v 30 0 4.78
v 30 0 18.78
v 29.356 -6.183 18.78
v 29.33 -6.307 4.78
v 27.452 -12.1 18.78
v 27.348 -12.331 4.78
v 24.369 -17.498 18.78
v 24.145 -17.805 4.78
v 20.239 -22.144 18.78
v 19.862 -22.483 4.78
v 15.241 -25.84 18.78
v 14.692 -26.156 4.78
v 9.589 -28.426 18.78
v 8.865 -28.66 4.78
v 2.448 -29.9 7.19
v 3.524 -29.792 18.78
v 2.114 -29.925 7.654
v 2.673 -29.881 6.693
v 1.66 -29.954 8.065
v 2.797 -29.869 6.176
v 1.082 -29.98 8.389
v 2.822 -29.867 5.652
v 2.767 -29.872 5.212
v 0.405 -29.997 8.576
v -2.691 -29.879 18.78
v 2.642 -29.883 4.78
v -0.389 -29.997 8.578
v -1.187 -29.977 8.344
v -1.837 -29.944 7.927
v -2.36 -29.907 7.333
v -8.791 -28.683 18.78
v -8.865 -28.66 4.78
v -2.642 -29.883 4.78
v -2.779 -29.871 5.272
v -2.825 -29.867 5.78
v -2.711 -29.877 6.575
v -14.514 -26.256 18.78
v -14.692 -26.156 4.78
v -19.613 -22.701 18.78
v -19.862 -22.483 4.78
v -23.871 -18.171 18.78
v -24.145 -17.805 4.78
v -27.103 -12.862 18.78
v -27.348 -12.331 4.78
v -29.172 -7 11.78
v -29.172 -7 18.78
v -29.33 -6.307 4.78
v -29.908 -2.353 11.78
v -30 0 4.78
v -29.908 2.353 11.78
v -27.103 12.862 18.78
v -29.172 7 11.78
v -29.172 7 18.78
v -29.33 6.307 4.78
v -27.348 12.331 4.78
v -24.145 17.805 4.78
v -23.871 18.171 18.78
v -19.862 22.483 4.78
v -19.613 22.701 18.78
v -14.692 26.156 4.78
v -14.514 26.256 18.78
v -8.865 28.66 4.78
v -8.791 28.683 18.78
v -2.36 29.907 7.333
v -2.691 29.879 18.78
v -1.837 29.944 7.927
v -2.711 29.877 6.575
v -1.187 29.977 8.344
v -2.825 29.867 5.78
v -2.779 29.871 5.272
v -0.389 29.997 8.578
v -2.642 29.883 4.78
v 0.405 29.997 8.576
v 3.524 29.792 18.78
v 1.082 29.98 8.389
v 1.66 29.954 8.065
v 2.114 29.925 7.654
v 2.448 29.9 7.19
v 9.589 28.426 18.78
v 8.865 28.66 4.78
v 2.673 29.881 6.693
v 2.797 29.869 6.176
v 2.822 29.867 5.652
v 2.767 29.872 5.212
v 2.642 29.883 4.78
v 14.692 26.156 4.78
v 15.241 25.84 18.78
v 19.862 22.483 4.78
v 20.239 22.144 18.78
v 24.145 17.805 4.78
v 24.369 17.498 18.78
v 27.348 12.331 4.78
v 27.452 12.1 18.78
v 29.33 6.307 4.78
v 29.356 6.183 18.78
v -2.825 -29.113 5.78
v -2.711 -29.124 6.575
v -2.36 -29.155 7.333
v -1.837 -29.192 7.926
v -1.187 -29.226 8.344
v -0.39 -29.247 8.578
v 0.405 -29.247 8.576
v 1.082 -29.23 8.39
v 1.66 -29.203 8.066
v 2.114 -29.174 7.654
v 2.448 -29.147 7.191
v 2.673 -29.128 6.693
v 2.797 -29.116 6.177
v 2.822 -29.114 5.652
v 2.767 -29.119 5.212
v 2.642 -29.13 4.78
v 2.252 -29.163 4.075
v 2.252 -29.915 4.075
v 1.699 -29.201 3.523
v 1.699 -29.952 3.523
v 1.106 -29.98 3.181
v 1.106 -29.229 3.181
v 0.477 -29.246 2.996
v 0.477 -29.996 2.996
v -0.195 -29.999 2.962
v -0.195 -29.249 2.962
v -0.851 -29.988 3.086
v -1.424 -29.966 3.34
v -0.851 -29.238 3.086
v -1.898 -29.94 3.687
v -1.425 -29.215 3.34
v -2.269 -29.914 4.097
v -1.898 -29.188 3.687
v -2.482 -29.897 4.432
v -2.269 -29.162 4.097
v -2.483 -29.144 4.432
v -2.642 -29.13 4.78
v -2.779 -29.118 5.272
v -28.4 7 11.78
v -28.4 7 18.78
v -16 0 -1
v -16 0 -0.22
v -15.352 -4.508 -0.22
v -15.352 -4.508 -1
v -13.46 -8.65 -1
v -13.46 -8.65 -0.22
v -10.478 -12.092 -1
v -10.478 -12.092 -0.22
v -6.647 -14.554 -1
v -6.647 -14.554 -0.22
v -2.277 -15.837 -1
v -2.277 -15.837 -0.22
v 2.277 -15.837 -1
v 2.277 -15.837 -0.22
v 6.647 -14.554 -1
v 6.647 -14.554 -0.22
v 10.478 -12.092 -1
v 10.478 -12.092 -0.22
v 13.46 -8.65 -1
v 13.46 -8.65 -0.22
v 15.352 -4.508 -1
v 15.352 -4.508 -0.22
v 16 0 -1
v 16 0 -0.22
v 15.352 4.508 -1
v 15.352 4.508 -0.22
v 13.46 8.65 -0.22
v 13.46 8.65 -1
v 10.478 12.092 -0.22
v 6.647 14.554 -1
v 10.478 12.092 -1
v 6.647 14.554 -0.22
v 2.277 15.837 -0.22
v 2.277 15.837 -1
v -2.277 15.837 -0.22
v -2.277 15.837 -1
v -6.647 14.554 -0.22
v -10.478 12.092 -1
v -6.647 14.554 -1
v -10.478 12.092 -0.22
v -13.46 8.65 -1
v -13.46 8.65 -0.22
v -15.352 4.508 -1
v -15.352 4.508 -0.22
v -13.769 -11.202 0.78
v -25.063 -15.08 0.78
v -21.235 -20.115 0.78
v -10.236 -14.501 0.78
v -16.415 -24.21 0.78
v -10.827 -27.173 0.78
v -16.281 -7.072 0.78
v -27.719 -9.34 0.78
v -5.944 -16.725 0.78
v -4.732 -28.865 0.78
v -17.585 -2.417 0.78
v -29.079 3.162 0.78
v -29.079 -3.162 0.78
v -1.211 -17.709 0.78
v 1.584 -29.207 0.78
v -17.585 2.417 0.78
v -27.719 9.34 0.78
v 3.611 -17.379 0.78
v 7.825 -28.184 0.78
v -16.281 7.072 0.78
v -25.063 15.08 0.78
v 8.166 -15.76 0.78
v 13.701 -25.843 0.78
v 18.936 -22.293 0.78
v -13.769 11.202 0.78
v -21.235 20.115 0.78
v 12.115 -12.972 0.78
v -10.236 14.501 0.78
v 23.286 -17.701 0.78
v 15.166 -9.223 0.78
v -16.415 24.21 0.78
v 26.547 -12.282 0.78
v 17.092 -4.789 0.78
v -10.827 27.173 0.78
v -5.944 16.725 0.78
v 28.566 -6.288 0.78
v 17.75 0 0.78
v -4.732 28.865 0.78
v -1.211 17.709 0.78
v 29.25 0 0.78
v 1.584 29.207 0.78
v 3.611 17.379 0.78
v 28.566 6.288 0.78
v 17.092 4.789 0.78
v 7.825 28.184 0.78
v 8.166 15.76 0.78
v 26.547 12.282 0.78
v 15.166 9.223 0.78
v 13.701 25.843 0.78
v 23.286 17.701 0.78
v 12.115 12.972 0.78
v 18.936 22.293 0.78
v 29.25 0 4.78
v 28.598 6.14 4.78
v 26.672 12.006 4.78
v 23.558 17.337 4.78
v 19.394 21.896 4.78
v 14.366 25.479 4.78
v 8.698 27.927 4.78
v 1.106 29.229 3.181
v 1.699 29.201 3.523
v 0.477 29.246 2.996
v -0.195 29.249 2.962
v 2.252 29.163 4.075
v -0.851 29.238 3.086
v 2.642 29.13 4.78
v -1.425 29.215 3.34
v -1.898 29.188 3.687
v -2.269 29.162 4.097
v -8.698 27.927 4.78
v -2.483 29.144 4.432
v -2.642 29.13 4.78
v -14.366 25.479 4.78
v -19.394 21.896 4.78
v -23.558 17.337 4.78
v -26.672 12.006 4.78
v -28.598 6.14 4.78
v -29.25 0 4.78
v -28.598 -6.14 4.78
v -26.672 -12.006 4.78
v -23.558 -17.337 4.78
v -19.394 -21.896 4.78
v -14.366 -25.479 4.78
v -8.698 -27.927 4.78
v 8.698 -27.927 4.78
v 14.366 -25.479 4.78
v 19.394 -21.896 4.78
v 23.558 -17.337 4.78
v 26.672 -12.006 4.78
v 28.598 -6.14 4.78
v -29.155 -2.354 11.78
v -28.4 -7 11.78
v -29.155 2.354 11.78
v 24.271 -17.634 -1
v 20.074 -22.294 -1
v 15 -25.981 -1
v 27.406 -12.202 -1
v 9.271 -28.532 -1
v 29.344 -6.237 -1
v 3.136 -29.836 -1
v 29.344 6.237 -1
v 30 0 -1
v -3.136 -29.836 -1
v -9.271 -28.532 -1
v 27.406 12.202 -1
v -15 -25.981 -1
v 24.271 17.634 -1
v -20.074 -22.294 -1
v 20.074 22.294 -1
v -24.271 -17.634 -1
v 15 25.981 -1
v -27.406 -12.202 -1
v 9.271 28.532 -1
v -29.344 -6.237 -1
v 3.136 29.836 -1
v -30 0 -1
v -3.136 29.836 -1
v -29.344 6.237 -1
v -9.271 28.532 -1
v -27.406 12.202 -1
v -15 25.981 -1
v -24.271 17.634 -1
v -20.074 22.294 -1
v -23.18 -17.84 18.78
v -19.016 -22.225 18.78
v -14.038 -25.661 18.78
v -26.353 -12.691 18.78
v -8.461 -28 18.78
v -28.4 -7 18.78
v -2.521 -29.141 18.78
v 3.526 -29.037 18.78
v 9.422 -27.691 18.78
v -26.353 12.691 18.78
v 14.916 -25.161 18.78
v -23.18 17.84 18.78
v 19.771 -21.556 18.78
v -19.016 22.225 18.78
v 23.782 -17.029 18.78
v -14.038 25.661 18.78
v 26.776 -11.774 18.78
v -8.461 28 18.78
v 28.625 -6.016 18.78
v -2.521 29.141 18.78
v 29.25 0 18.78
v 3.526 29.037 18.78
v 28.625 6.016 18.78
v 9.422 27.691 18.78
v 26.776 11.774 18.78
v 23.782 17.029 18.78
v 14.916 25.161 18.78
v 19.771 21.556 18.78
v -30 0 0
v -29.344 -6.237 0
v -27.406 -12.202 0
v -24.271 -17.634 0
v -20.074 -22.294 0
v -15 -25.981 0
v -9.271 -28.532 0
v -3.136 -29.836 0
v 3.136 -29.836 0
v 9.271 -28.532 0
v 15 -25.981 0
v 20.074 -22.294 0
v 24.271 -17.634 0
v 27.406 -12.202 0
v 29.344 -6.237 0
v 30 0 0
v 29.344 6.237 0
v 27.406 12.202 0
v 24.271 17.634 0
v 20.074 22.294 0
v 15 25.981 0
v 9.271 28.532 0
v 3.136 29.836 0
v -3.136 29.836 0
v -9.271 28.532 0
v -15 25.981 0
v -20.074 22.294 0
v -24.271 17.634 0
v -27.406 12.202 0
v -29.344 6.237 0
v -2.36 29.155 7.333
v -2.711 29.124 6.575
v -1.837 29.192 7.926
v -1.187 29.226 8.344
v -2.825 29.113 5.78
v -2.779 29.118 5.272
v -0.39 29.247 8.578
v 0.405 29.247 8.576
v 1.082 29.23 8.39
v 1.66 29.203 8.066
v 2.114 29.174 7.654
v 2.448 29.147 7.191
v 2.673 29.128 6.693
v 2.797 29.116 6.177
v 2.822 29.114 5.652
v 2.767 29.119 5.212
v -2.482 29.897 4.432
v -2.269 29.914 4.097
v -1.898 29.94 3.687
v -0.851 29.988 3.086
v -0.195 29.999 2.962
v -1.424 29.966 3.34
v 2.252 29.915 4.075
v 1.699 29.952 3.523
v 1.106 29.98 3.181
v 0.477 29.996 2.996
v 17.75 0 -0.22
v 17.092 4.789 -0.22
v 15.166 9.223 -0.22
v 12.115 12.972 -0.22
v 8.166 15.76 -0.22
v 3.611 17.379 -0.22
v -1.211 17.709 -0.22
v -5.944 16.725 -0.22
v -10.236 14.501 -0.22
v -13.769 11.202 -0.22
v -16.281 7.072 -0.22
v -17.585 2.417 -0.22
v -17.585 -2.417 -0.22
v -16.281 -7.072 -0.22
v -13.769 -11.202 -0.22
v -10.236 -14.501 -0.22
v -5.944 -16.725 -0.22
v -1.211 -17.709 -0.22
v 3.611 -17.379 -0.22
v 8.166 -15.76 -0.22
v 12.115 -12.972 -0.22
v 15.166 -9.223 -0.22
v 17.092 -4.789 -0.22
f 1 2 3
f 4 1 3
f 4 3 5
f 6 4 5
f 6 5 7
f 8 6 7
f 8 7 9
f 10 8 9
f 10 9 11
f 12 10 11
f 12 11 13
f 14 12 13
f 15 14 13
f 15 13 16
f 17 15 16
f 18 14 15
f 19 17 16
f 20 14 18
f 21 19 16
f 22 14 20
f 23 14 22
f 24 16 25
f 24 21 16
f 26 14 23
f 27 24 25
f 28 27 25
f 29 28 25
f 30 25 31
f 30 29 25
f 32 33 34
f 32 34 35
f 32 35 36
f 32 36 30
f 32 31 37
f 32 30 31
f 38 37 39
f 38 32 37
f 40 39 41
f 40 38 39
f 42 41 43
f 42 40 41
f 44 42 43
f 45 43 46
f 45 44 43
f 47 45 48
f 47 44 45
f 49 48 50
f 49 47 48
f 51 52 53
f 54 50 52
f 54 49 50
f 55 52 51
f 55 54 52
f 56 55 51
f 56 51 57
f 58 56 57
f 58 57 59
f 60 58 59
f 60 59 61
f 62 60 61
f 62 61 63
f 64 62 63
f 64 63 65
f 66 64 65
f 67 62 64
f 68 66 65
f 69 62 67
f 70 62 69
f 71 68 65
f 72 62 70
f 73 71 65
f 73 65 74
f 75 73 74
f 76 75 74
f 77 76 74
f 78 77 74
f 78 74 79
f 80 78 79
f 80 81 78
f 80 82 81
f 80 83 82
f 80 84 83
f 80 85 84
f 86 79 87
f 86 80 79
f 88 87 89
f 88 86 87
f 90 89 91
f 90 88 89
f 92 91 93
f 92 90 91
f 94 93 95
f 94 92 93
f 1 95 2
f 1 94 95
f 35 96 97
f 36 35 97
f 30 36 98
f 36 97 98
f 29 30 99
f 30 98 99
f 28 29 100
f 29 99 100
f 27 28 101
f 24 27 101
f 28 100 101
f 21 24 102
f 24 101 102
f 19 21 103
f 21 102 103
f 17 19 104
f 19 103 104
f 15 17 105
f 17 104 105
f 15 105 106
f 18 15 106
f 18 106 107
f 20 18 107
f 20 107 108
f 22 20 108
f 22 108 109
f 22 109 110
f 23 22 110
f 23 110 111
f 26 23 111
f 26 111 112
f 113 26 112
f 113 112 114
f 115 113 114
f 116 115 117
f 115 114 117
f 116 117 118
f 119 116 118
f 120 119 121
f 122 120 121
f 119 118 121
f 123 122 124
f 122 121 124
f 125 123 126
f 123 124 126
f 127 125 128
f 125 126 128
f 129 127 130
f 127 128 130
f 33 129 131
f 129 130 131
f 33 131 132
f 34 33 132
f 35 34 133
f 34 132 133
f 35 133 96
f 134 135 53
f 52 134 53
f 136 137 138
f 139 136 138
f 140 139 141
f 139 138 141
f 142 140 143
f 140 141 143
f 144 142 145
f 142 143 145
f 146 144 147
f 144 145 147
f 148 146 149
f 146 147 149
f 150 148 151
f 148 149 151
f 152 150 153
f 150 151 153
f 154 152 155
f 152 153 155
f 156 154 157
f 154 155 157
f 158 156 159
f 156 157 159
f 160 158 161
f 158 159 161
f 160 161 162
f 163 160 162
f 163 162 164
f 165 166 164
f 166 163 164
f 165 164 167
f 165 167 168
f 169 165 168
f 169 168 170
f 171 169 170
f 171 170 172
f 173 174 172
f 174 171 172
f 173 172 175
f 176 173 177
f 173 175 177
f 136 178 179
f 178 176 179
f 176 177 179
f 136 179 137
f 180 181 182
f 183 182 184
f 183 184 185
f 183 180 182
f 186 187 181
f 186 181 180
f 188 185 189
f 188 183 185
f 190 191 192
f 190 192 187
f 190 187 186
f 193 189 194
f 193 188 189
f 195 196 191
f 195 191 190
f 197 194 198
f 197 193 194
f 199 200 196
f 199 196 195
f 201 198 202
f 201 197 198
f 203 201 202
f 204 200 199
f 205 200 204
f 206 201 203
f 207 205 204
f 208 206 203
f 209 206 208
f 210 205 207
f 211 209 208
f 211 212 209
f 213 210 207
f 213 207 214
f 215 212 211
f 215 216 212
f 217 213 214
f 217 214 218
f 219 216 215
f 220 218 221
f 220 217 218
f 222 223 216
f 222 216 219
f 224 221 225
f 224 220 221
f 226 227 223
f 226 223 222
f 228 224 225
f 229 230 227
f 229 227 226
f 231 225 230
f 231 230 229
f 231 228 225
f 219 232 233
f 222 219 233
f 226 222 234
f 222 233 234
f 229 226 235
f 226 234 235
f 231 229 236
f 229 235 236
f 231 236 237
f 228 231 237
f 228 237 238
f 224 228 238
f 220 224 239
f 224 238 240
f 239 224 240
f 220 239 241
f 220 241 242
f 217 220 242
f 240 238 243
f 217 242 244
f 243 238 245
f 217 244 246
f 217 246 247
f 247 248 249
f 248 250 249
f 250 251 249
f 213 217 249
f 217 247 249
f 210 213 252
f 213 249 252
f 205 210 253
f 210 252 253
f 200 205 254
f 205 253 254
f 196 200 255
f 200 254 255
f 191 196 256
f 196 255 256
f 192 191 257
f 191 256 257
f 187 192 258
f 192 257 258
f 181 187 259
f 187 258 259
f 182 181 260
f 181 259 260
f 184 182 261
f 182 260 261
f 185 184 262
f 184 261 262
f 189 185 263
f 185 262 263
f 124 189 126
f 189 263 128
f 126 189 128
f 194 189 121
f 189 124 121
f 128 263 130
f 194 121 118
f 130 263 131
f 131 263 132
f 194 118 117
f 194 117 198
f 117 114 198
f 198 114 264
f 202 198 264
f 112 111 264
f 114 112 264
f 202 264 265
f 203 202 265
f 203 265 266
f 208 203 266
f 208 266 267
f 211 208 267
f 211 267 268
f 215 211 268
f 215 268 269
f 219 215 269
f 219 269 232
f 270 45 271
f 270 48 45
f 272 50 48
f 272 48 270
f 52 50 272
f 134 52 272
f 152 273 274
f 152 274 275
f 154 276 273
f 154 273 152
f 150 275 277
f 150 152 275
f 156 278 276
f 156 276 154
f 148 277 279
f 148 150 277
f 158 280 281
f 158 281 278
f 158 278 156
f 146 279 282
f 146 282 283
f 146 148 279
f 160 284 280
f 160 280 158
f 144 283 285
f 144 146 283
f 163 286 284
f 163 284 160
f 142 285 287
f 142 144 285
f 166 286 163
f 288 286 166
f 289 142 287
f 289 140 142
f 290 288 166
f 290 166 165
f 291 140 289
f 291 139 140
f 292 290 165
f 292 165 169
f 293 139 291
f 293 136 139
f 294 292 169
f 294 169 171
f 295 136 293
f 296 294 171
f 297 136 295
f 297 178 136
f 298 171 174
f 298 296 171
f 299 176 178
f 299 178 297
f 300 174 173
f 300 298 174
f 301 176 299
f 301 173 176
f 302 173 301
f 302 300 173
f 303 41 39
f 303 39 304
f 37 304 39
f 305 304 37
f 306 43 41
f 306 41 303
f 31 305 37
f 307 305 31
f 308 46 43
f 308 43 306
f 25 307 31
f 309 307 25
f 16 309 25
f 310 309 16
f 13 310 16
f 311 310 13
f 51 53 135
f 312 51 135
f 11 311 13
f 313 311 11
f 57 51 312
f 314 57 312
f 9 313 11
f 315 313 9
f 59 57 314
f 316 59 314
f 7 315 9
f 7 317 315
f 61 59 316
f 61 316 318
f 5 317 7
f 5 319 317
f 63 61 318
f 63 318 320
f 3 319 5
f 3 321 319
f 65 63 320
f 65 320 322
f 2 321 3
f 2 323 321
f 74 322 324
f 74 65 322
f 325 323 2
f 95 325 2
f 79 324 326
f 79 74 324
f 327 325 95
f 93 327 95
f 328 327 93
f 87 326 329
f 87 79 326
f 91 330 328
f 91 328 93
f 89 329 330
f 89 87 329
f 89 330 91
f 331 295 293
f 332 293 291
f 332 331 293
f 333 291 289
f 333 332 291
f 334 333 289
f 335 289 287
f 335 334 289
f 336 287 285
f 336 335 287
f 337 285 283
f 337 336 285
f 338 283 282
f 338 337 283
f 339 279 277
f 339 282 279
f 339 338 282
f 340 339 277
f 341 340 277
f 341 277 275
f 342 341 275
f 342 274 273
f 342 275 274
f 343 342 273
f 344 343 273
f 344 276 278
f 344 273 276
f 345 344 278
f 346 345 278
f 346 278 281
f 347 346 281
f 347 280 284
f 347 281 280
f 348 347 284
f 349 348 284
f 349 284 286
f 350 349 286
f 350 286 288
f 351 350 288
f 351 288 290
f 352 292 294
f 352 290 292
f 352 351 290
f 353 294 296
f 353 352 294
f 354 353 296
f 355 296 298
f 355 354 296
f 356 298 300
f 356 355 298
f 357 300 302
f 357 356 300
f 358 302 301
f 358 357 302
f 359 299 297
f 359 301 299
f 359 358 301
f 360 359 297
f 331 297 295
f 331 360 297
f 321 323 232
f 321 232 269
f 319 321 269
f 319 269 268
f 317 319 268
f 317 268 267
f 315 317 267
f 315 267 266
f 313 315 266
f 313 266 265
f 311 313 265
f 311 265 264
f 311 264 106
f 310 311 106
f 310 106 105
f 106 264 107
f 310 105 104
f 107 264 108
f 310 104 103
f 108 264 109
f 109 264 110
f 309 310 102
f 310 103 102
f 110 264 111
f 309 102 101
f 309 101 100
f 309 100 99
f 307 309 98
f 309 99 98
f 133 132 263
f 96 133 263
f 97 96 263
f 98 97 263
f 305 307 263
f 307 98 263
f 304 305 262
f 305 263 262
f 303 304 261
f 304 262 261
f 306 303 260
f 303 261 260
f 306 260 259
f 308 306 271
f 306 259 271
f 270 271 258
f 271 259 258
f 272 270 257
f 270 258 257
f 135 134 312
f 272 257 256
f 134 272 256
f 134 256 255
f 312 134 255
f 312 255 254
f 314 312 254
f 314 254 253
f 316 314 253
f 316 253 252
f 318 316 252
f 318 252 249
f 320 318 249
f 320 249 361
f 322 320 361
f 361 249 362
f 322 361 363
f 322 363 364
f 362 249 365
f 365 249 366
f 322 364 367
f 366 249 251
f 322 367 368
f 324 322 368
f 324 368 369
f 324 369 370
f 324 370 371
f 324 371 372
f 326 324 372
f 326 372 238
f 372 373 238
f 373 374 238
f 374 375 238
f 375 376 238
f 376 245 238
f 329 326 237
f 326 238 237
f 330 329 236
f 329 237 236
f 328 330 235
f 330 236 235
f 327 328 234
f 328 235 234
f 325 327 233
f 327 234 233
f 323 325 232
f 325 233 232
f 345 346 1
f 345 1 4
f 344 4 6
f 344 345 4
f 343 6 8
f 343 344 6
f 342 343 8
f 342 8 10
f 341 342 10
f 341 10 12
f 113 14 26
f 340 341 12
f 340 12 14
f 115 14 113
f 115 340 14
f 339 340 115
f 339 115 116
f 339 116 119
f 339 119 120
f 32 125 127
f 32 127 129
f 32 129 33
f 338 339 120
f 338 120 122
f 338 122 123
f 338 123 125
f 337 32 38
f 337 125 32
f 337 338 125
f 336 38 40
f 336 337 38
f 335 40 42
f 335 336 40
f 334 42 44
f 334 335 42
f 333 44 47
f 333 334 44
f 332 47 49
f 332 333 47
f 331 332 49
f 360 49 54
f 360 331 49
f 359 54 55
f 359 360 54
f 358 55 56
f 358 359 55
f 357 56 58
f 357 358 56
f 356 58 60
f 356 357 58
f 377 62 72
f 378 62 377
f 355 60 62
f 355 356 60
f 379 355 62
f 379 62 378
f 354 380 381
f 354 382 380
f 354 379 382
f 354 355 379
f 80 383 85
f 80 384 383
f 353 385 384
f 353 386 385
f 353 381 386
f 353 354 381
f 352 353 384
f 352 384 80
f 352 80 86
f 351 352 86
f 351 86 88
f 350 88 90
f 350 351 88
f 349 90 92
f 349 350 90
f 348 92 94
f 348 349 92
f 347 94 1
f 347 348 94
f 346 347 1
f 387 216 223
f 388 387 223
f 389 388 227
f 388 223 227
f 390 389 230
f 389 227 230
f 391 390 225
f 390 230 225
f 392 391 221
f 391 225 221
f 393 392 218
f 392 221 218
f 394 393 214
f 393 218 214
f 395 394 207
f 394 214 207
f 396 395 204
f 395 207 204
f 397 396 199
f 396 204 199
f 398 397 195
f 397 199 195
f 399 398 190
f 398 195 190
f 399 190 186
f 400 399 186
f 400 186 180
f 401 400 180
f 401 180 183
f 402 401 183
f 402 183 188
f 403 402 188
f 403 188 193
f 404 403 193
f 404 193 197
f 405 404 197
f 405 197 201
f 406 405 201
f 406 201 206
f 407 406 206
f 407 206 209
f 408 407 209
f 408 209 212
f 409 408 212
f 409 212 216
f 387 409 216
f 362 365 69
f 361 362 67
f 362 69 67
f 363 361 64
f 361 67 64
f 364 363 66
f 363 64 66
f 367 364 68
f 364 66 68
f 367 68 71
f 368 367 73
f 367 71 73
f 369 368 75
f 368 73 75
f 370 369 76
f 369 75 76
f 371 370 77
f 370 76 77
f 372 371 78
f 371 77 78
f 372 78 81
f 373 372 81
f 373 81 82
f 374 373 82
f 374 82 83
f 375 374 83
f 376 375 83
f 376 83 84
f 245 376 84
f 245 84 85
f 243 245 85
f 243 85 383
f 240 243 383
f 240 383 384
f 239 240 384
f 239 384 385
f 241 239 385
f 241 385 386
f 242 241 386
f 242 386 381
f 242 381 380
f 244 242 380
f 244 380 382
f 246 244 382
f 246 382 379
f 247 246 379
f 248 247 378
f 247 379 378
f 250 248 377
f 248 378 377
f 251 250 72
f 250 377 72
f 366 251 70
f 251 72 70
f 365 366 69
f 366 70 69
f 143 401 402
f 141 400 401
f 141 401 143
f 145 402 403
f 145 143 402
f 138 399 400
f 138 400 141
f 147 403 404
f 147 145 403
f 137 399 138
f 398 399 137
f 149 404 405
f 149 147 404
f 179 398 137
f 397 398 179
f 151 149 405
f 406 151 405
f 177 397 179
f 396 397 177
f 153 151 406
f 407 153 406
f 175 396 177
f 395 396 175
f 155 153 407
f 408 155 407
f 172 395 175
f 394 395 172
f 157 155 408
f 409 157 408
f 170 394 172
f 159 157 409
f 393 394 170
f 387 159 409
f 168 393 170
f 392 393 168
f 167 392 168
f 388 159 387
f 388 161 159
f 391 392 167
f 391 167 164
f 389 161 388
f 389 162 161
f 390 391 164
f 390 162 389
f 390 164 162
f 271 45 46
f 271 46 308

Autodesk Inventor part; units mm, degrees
ref_plane "YZ Plane" through (0, 0, 0) normal (1, 0, 0) x (0, 1, 0)
ref_plane "XZ Plane" through (0, 0, 0) normal (0, 1, 0) x (-1, 0, 0)
ref_plane "XY Plane" through (0, 0, 0) normal (0, 0, 1) x (1, 0, 0)
sketch "Sketch1" plane through (0, 0, 0) normal (0, 0, 1) x (1, 0, 0)
  circle A0 centre (0, 0) radius 30
  dimension "d0" = 60
extrude "Initial Cylinder" add sketch "Sketch1" along normal blind 4.78
sketch "Sketch2" plane through (0, 0, 4.78) normal (0, 0, 1) x (1, 0, 0)
  circle A0 centre (0, 0) radius 16
  dimension "d3" = 32
extrude "Through-hole" cut sketch "Sketch2" against normal blind 548
sketch "Sketch3" plane through (0, 0, 4.78) normal (0, 0, 1) x (1, 0, 0)
  circle A0 centre (0, 0) radius 29.25
  dimension "d6" = 58.5
extrude "snug ring fit" cut sketch "Sketch3" against normal blind 4
sketch "Sketch5" plane through (0, 0, 0) normal (0, 1, 0) x (-1, 0, 0)
  line L0 (30, 4.78) -> (-30, 4.78) projected
  line L1 (30, 0) -> (-30, 0) projected
  point P0 (0, 0)
  dimension "d16" = 4.78
sketch "Sketch6" plane through (0, 0, 0.78) normal (0, 0, 1) x (1, 0, 0)
  circle A0 centre (0, 0) radius 17.65
  dimension "d17" = 35.3
extrude "Piezo Puzzle indent" cut sketch "Sketch6" against normal blind 0.5
sketch "Sketch7" plane through (0, 0, 0) normal (0, 0, -1) x (-1, 0, 0)
  circle A0 centre (0, 0) radius 16 projected
  circle A1 centre (0, 0) radius 30 projected
extrude "Extra forward thickness" add sketch "Sketch7" along normal blind 1
sketch "Sketch8" plane through (0, 0, 0.28) normal (0, 0, 1) x (1, 0, 0)
  circle A0 centre (0, 0) radius 16 projected
  circle A1 centre (0, 0) radius 17.65 projected
  circle A2 centre (0, 0) radius 17.75
  dimension "d26" = 35.5
extrude "Piezo accomodation for EFT^" cut sketch "Sketch8" along normal mid plane 1 contours A0 | A1 | A2
sketch "Sketch9" plane through (0, 0, 4.78) normal (0, 0, 1) x (1, 0, 0)
  circle A0 centre (0, 0) radius 29.25 projected
  circle A1 centre (0, 0) radius 30 projected
extrude "Downoward extension" add sketch "Sketch9" along normal blind 14
sketch "Sketch4" plane through (0, 0, 0) normal (0, 1, 0) x (-1, 0, 0)
  line L0 (30, 4.78) -> (-30, 4.78) projected
  line L1 (0, 4.78) -> (0, 5.78)
  circle A0 centre (0, 5.78) radius 2.825
  point P0 (0, 0)
  dimension "d10" = 5.65
  dimension "d29" = 1
extrude "Bolt through-hole" cut sketch "Sketch4" along normal mid plane 548
sketch "Sketch11" plane through (0, 0, 18.78) normal (0, 0, 1) x (1, 0, 0)
  line L0 (0, 0) -> (-30, 0)
  circle A0 centre (0, 0) radius 30 projected
  line L1 (-27.0677, -7) -> (-27.0677, 7)
  line L2 (-27.0677, 7) -> (-32.9323, 7)
  line L3 (-32.9323, 7) -> (-32.9323, -7)
  line L4 (-32.9323, -7) -> (-27.0677, -7)
  line L5 (-27.0677, -7) -> (-32.9323, 7) construction
  line L6 (-27.0677, 7) -> (-32.9323, -7) construction
  point P0 (-29.1719, 7)
  point P1 (-29.1719, -7)
  dimension "d32" = 14
extrude "Extrusion10" cut sketch "Sketch11" against normal blind 7 contours L1 L4 A0 L0 | L0 A0 L2 L1
properties part number "Diaphragm_lock"
